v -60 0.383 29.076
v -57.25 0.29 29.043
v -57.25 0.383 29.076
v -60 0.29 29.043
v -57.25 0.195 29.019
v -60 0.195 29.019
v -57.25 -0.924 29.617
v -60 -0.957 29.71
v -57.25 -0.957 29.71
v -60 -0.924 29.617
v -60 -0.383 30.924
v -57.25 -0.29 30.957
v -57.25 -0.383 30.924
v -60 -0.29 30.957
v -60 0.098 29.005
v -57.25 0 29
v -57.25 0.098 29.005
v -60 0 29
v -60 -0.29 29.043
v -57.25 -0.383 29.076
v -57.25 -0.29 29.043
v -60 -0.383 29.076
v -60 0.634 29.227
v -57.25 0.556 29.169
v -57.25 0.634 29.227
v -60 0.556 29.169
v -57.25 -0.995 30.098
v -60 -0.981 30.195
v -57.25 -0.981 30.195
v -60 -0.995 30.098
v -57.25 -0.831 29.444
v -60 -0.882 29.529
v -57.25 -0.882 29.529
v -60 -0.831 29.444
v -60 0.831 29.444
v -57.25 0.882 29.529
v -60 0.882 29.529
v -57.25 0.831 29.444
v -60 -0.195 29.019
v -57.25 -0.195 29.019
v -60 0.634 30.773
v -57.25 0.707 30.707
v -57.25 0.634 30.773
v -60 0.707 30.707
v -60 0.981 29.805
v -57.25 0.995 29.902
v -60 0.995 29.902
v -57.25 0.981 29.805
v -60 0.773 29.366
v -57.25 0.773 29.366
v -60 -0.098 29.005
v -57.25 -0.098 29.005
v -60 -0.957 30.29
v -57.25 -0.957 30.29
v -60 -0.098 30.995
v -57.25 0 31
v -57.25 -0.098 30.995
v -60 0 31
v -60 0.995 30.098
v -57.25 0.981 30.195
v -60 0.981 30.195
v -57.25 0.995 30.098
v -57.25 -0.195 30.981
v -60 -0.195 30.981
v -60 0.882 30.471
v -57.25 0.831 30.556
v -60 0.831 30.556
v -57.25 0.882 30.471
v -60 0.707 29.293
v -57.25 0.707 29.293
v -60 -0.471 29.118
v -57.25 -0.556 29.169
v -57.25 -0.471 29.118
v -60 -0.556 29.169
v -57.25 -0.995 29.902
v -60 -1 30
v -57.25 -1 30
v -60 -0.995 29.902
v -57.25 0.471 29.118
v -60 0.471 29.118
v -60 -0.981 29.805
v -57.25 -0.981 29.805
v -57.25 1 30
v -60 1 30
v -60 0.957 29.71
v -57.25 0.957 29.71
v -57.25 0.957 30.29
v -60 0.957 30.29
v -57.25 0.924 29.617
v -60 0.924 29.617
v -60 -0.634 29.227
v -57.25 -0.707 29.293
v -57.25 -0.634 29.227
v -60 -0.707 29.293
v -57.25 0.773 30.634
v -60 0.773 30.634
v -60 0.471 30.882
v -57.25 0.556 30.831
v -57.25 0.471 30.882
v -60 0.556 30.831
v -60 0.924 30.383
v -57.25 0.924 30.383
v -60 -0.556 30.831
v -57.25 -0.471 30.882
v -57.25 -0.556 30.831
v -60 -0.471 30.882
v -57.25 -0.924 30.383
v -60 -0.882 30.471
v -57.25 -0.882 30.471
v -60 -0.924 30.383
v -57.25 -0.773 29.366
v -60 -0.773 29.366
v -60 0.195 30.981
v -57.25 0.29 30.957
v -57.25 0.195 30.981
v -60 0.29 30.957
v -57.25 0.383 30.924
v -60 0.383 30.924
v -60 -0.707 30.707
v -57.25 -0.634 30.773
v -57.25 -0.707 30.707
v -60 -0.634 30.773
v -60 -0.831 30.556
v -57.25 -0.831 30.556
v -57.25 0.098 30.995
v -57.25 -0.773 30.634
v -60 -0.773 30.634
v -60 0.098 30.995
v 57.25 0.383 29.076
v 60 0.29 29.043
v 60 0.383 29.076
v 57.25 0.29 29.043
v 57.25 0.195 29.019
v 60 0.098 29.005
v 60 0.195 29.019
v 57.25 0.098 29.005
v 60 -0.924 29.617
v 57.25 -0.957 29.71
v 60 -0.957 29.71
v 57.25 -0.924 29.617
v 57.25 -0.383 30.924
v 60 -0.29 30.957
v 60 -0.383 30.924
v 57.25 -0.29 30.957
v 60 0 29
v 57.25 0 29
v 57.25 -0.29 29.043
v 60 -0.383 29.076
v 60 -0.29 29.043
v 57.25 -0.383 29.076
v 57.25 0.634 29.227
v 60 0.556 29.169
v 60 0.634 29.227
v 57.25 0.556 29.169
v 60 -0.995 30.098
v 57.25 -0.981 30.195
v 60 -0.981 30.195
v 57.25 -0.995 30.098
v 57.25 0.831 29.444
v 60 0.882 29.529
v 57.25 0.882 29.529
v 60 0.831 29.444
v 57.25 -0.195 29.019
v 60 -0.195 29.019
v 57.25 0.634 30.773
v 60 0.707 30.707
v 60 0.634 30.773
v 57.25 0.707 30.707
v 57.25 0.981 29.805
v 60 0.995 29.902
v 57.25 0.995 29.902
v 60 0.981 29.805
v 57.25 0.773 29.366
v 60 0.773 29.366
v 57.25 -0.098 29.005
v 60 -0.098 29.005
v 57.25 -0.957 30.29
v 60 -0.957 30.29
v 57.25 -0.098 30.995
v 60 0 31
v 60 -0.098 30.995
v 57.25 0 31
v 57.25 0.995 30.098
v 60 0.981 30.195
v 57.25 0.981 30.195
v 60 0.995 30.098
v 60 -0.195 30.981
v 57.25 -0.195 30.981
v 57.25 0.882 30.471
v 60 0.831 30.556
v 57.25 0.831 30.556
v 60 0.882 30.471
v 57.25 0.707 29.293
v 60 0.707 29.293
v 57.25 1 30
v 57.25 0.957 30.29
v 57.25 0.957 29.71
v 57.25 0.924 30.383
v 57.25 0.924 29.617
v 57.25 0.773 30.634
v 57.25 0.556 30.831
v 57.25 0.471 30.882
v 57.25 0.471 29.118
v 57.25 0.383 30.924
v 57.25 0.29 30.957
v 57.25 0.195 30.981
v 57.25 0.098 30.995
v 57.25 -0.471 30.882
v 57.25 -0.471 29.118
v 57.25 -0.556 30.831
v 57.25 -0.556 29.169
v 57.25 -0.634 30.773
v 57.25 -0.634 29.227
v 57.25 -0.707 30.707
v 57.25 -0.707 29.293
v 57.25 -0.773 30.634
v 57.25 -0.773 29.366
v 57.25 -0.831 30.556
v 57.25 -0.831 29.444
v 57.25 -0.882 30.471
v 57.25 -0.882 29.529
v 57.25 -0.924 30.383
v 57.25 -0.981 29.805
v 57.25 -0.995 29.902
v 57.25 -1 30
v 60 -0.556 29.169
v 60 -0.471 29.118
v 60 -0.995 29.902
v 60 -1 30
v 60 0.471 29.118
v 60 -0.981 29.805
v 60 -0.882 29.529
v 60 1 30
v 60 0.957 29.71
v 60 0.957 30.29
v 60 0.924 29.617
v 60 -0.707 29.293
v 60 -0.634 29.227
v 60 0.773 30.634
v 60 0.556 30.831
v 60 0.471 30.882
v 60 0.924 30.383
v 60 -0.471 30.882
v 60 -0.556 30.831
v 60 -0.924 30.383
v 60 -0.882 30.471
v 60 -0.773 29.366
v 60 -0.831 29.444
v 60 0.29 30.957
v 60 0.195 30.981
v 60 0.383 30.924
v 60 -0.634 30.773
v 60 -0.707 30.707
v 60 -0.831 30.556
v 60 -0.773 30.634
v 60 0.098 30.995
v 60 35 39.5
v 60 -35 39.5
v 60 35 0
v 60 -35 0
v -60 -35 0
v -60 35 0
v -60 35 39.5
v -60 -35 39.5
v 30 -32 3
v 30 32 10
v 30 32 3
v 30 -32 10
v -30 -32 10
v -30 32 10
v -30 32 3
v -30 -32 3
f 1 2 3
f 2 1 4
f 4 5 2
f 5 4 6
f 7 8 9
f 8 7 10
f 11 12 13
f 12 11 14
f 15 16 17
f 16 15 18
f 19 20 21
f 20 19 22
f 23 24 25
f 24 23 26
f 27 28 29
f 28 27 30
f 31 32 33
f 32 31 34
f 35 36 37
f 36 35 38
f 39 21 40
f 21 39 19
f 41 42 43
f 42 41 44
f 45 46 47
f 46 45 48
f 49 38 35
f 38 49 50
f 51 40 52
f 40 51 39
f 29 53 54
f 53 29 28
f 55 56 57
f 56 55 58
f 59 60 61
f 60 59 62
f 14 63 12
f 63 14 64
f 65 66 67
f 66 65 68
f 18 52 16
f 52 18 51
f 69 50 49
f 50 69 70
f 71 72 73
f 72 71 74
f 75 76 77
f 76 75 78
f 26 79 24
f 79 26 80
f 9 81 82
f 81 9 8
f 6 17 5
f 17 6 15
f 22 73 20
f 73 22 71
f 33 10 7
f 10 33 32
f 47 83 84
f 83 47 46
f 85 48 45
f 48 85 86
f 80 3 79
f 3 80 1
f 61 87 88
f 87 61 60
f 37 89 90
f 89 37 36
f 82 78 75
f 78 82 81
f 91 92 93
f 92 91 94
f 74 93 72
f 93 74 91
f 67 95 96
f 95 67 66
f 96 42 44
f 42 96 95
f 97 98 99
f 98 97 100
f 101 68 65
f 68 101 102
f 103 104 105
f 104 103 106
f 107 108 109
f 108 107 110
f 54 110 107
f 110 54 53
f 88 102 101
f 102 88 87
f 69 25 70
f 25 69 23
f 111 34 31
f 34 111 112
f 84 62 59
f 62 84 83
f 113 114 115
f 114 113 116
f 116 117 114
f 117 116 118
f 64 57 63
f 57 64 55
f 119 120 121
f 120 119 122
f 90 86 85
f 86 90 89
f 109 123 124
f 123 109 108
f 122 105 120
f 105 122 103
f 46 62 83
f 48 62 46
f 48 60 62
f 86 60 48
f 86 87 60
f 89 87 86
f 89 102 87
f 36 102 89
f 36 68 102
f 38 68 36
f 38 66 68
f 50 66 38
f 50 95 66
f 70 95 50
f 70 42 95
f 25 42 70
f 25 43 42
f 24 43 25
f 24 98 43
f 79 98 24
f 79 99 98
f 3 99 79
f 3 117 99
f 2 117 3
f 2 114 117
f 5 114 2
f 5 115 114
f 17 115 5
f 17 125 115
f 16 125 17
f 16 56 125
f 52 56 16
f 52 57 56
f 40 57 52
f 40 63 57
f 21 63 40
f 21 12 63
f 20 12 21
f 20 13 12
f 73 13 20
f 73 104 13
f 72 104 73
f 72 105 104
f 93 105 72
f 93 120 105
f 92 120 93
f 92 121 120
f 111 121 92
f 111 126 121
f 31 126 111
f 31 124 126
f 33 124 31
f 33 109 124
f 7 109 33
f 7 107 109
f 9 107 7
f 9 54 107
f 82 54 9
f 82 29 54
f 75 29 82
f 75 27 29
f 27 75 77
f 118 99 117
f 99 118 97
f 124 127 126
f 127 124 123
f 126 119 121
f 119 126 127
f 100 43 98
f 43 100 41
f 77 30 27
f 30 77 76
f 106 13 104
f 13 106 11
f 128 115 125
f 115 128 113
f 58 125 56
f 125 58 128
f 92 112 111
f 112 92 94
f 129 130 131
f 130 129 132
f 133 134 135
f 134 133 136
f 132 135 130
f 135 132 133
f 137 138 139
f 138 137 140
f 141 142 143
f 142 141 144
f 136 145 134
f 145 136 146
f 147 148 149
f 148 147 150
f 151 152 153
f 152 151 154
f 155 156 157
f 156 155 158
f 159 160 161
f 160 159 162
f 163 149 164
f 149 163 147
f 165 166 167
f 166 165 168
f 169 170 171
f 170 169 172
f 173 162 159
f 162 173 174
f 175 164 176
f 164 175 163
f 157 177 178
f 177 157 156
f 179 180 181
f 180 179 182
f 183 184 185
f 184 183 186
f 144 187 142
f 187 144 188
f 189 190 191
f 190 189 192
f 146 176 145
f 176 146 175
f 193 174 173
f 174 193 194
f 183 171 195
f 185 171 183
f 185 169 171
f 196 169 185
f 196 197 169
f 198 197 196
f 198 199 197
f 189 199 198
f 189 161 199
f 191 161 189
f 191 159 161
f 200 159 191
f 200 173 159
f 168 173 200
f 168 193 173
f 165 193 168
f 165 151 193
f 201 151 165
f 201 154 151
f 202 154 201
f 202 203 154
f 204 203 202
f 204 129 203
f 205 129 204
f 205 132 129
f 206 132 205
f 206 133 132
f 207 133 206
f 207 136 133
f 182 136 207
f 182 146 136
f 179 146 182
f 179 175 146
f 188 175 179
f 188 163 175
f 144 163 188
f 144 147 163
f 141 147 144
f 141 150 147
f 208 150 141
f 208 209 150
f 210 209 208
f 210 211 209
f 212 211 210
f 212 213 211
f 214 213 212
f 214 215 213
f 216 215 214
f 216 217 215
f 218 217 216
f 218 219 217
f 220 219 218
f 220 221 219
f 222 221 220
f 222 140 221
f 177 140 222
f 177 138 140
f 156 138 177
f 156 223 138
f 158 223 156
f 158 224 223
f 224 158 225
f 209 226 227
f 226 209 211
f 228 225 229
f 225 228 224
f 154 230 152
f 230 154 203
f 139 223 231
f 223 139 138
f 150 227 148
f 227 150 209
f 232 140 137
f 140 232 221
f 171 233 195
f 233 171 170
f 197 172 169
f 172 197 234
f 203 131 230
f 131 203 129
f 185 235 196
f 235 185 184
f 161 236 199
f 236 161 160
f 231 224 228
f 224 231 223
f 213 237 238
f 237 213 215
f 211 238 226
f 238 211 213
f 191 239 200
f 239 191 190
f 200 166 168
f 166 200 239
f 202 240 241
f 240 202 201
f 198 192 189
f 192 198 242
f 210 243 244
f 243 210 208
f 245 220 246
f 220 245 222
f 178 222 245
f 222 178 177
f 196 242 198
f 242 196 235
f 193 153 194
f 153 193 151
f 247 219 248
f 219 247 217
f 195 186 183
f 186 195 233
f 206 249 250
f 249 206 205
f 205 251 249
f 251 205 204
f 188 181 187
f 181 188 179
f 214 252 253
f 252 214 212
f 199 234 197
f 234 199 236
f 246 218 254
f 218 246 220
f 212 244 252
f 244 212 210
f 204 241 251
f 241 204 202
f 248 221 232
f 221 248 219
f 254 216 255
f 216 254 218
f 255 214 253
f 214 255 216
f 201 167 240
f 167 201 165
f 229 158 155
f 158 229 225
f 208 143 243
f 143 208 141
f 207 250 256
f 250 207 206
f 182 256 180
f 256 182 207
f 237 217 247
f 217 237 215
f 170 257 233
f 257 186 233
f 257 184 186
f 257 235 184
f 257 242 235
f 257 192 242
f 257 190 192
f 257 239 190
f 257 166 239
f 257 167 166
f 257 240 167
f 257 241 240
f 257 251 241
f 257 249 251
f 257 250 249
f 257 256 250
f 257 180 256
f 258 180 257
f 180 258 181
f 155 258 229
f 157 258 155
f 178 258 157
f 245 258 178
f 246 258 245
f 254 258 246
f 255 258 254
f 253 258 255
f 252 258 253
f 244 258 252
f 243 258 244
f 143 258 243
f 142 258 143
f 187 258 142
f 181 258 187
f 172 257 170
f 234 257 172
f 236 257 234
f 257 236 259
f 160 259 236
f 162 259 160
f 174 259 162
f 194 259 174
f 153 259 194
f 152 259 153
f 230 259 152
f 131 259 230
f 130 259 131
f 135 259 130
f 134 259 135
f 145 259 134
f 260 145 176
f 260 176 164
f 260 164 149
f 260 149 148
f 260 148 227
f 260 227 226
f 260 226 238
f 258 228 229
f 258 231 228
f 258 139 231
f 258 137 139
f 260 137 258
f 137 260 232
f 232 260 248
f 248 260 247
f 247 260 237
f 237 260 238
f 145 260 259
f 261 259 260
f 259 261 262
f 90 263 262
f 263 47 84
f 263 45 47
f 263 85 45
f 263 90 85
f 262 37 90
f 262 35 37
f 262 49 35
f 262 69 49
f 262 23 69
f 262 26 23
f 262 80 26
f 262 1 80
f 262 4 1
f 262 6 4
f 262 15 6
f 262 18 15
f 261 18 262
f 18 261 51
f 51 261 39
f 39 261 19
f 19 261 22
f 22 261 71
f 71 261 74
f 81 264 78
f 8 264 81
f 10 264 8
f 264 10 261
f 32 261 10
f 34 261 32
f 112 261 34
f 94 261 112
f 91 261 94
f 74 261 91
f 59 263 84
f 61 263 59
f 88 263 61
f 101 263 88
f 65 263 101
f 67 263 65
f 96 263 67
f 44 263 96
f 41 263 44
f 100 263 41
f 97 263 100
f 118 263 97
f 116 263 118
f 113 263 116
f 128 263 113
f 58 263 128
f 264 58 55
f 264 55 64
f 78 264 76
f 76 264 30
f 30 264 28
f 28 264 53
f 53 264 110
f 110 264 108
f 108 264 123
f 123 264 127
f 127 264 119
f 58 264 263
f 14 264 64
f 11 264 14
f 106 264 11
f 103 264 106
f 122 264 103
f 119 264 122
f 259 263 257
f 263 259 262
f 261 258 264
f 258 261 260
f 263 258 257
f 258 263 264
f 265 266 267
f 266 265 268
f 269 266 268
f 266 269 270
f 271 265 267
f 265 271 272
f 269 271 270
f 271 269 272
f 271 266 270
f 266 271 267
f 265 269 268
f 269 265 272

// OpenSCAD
// Mini horizontal gel-electrophoresis box - buffer tank
// Print orientation: tank rests on XY plane, open top facing +Z

$fn = 64;

// ---- Tank ----
tank_x = 120;      // outer length (X)
tank_y = 70;       // outer width (Y)
tank_z = 40;       // outer height (Z)
wall   = 3;        // wall thickness
floor  = 3;        // floor thickness

// ---- Platform ----
plat_x = 60;       // platform length in X
plat_y = tank_y - 2*wall;  // platform spans full inner width (Y)
plat_top = 10;     // platform top height above tank bottom (z)

// ---- Electrode holes ----
hole_d = 2;        // horizontal hole diameter (along X)
hole_y = 0;        // hole centre Y
hole_z = 30;       // hole centre Z

// ---- Misc ----
eps = 0.5;         // cutter overshoot past faces

difference() {
    // Tank body
    translate([-tank_x/2, -tank_y/2, 0])
        cube([tank_x, tank_y, tank_z]);

    // Open top
    translate([-tank_x/2, -tank_y/2, tank_z - eps])
        cube([tank_x, tank_y, eps]);

    // Raised platform (solid, divides bottom into two chambers)
    translate([-tank_x/2 + (tank_x - plat_x)/2, -plat_y/2, floor])
        cube([plat_x, plat_y, plat_top - floor]);

    // Horizontal electrode holes through each end wall (along X)
    for (sx = [-1, 1])
        translate([sx * (tank_x/2 - hole_d/2), hole_y, hole_z])
            rotate([0, 90, 0])
                cylinder(d = hole_d, h = wall + eps, center = true);
}
